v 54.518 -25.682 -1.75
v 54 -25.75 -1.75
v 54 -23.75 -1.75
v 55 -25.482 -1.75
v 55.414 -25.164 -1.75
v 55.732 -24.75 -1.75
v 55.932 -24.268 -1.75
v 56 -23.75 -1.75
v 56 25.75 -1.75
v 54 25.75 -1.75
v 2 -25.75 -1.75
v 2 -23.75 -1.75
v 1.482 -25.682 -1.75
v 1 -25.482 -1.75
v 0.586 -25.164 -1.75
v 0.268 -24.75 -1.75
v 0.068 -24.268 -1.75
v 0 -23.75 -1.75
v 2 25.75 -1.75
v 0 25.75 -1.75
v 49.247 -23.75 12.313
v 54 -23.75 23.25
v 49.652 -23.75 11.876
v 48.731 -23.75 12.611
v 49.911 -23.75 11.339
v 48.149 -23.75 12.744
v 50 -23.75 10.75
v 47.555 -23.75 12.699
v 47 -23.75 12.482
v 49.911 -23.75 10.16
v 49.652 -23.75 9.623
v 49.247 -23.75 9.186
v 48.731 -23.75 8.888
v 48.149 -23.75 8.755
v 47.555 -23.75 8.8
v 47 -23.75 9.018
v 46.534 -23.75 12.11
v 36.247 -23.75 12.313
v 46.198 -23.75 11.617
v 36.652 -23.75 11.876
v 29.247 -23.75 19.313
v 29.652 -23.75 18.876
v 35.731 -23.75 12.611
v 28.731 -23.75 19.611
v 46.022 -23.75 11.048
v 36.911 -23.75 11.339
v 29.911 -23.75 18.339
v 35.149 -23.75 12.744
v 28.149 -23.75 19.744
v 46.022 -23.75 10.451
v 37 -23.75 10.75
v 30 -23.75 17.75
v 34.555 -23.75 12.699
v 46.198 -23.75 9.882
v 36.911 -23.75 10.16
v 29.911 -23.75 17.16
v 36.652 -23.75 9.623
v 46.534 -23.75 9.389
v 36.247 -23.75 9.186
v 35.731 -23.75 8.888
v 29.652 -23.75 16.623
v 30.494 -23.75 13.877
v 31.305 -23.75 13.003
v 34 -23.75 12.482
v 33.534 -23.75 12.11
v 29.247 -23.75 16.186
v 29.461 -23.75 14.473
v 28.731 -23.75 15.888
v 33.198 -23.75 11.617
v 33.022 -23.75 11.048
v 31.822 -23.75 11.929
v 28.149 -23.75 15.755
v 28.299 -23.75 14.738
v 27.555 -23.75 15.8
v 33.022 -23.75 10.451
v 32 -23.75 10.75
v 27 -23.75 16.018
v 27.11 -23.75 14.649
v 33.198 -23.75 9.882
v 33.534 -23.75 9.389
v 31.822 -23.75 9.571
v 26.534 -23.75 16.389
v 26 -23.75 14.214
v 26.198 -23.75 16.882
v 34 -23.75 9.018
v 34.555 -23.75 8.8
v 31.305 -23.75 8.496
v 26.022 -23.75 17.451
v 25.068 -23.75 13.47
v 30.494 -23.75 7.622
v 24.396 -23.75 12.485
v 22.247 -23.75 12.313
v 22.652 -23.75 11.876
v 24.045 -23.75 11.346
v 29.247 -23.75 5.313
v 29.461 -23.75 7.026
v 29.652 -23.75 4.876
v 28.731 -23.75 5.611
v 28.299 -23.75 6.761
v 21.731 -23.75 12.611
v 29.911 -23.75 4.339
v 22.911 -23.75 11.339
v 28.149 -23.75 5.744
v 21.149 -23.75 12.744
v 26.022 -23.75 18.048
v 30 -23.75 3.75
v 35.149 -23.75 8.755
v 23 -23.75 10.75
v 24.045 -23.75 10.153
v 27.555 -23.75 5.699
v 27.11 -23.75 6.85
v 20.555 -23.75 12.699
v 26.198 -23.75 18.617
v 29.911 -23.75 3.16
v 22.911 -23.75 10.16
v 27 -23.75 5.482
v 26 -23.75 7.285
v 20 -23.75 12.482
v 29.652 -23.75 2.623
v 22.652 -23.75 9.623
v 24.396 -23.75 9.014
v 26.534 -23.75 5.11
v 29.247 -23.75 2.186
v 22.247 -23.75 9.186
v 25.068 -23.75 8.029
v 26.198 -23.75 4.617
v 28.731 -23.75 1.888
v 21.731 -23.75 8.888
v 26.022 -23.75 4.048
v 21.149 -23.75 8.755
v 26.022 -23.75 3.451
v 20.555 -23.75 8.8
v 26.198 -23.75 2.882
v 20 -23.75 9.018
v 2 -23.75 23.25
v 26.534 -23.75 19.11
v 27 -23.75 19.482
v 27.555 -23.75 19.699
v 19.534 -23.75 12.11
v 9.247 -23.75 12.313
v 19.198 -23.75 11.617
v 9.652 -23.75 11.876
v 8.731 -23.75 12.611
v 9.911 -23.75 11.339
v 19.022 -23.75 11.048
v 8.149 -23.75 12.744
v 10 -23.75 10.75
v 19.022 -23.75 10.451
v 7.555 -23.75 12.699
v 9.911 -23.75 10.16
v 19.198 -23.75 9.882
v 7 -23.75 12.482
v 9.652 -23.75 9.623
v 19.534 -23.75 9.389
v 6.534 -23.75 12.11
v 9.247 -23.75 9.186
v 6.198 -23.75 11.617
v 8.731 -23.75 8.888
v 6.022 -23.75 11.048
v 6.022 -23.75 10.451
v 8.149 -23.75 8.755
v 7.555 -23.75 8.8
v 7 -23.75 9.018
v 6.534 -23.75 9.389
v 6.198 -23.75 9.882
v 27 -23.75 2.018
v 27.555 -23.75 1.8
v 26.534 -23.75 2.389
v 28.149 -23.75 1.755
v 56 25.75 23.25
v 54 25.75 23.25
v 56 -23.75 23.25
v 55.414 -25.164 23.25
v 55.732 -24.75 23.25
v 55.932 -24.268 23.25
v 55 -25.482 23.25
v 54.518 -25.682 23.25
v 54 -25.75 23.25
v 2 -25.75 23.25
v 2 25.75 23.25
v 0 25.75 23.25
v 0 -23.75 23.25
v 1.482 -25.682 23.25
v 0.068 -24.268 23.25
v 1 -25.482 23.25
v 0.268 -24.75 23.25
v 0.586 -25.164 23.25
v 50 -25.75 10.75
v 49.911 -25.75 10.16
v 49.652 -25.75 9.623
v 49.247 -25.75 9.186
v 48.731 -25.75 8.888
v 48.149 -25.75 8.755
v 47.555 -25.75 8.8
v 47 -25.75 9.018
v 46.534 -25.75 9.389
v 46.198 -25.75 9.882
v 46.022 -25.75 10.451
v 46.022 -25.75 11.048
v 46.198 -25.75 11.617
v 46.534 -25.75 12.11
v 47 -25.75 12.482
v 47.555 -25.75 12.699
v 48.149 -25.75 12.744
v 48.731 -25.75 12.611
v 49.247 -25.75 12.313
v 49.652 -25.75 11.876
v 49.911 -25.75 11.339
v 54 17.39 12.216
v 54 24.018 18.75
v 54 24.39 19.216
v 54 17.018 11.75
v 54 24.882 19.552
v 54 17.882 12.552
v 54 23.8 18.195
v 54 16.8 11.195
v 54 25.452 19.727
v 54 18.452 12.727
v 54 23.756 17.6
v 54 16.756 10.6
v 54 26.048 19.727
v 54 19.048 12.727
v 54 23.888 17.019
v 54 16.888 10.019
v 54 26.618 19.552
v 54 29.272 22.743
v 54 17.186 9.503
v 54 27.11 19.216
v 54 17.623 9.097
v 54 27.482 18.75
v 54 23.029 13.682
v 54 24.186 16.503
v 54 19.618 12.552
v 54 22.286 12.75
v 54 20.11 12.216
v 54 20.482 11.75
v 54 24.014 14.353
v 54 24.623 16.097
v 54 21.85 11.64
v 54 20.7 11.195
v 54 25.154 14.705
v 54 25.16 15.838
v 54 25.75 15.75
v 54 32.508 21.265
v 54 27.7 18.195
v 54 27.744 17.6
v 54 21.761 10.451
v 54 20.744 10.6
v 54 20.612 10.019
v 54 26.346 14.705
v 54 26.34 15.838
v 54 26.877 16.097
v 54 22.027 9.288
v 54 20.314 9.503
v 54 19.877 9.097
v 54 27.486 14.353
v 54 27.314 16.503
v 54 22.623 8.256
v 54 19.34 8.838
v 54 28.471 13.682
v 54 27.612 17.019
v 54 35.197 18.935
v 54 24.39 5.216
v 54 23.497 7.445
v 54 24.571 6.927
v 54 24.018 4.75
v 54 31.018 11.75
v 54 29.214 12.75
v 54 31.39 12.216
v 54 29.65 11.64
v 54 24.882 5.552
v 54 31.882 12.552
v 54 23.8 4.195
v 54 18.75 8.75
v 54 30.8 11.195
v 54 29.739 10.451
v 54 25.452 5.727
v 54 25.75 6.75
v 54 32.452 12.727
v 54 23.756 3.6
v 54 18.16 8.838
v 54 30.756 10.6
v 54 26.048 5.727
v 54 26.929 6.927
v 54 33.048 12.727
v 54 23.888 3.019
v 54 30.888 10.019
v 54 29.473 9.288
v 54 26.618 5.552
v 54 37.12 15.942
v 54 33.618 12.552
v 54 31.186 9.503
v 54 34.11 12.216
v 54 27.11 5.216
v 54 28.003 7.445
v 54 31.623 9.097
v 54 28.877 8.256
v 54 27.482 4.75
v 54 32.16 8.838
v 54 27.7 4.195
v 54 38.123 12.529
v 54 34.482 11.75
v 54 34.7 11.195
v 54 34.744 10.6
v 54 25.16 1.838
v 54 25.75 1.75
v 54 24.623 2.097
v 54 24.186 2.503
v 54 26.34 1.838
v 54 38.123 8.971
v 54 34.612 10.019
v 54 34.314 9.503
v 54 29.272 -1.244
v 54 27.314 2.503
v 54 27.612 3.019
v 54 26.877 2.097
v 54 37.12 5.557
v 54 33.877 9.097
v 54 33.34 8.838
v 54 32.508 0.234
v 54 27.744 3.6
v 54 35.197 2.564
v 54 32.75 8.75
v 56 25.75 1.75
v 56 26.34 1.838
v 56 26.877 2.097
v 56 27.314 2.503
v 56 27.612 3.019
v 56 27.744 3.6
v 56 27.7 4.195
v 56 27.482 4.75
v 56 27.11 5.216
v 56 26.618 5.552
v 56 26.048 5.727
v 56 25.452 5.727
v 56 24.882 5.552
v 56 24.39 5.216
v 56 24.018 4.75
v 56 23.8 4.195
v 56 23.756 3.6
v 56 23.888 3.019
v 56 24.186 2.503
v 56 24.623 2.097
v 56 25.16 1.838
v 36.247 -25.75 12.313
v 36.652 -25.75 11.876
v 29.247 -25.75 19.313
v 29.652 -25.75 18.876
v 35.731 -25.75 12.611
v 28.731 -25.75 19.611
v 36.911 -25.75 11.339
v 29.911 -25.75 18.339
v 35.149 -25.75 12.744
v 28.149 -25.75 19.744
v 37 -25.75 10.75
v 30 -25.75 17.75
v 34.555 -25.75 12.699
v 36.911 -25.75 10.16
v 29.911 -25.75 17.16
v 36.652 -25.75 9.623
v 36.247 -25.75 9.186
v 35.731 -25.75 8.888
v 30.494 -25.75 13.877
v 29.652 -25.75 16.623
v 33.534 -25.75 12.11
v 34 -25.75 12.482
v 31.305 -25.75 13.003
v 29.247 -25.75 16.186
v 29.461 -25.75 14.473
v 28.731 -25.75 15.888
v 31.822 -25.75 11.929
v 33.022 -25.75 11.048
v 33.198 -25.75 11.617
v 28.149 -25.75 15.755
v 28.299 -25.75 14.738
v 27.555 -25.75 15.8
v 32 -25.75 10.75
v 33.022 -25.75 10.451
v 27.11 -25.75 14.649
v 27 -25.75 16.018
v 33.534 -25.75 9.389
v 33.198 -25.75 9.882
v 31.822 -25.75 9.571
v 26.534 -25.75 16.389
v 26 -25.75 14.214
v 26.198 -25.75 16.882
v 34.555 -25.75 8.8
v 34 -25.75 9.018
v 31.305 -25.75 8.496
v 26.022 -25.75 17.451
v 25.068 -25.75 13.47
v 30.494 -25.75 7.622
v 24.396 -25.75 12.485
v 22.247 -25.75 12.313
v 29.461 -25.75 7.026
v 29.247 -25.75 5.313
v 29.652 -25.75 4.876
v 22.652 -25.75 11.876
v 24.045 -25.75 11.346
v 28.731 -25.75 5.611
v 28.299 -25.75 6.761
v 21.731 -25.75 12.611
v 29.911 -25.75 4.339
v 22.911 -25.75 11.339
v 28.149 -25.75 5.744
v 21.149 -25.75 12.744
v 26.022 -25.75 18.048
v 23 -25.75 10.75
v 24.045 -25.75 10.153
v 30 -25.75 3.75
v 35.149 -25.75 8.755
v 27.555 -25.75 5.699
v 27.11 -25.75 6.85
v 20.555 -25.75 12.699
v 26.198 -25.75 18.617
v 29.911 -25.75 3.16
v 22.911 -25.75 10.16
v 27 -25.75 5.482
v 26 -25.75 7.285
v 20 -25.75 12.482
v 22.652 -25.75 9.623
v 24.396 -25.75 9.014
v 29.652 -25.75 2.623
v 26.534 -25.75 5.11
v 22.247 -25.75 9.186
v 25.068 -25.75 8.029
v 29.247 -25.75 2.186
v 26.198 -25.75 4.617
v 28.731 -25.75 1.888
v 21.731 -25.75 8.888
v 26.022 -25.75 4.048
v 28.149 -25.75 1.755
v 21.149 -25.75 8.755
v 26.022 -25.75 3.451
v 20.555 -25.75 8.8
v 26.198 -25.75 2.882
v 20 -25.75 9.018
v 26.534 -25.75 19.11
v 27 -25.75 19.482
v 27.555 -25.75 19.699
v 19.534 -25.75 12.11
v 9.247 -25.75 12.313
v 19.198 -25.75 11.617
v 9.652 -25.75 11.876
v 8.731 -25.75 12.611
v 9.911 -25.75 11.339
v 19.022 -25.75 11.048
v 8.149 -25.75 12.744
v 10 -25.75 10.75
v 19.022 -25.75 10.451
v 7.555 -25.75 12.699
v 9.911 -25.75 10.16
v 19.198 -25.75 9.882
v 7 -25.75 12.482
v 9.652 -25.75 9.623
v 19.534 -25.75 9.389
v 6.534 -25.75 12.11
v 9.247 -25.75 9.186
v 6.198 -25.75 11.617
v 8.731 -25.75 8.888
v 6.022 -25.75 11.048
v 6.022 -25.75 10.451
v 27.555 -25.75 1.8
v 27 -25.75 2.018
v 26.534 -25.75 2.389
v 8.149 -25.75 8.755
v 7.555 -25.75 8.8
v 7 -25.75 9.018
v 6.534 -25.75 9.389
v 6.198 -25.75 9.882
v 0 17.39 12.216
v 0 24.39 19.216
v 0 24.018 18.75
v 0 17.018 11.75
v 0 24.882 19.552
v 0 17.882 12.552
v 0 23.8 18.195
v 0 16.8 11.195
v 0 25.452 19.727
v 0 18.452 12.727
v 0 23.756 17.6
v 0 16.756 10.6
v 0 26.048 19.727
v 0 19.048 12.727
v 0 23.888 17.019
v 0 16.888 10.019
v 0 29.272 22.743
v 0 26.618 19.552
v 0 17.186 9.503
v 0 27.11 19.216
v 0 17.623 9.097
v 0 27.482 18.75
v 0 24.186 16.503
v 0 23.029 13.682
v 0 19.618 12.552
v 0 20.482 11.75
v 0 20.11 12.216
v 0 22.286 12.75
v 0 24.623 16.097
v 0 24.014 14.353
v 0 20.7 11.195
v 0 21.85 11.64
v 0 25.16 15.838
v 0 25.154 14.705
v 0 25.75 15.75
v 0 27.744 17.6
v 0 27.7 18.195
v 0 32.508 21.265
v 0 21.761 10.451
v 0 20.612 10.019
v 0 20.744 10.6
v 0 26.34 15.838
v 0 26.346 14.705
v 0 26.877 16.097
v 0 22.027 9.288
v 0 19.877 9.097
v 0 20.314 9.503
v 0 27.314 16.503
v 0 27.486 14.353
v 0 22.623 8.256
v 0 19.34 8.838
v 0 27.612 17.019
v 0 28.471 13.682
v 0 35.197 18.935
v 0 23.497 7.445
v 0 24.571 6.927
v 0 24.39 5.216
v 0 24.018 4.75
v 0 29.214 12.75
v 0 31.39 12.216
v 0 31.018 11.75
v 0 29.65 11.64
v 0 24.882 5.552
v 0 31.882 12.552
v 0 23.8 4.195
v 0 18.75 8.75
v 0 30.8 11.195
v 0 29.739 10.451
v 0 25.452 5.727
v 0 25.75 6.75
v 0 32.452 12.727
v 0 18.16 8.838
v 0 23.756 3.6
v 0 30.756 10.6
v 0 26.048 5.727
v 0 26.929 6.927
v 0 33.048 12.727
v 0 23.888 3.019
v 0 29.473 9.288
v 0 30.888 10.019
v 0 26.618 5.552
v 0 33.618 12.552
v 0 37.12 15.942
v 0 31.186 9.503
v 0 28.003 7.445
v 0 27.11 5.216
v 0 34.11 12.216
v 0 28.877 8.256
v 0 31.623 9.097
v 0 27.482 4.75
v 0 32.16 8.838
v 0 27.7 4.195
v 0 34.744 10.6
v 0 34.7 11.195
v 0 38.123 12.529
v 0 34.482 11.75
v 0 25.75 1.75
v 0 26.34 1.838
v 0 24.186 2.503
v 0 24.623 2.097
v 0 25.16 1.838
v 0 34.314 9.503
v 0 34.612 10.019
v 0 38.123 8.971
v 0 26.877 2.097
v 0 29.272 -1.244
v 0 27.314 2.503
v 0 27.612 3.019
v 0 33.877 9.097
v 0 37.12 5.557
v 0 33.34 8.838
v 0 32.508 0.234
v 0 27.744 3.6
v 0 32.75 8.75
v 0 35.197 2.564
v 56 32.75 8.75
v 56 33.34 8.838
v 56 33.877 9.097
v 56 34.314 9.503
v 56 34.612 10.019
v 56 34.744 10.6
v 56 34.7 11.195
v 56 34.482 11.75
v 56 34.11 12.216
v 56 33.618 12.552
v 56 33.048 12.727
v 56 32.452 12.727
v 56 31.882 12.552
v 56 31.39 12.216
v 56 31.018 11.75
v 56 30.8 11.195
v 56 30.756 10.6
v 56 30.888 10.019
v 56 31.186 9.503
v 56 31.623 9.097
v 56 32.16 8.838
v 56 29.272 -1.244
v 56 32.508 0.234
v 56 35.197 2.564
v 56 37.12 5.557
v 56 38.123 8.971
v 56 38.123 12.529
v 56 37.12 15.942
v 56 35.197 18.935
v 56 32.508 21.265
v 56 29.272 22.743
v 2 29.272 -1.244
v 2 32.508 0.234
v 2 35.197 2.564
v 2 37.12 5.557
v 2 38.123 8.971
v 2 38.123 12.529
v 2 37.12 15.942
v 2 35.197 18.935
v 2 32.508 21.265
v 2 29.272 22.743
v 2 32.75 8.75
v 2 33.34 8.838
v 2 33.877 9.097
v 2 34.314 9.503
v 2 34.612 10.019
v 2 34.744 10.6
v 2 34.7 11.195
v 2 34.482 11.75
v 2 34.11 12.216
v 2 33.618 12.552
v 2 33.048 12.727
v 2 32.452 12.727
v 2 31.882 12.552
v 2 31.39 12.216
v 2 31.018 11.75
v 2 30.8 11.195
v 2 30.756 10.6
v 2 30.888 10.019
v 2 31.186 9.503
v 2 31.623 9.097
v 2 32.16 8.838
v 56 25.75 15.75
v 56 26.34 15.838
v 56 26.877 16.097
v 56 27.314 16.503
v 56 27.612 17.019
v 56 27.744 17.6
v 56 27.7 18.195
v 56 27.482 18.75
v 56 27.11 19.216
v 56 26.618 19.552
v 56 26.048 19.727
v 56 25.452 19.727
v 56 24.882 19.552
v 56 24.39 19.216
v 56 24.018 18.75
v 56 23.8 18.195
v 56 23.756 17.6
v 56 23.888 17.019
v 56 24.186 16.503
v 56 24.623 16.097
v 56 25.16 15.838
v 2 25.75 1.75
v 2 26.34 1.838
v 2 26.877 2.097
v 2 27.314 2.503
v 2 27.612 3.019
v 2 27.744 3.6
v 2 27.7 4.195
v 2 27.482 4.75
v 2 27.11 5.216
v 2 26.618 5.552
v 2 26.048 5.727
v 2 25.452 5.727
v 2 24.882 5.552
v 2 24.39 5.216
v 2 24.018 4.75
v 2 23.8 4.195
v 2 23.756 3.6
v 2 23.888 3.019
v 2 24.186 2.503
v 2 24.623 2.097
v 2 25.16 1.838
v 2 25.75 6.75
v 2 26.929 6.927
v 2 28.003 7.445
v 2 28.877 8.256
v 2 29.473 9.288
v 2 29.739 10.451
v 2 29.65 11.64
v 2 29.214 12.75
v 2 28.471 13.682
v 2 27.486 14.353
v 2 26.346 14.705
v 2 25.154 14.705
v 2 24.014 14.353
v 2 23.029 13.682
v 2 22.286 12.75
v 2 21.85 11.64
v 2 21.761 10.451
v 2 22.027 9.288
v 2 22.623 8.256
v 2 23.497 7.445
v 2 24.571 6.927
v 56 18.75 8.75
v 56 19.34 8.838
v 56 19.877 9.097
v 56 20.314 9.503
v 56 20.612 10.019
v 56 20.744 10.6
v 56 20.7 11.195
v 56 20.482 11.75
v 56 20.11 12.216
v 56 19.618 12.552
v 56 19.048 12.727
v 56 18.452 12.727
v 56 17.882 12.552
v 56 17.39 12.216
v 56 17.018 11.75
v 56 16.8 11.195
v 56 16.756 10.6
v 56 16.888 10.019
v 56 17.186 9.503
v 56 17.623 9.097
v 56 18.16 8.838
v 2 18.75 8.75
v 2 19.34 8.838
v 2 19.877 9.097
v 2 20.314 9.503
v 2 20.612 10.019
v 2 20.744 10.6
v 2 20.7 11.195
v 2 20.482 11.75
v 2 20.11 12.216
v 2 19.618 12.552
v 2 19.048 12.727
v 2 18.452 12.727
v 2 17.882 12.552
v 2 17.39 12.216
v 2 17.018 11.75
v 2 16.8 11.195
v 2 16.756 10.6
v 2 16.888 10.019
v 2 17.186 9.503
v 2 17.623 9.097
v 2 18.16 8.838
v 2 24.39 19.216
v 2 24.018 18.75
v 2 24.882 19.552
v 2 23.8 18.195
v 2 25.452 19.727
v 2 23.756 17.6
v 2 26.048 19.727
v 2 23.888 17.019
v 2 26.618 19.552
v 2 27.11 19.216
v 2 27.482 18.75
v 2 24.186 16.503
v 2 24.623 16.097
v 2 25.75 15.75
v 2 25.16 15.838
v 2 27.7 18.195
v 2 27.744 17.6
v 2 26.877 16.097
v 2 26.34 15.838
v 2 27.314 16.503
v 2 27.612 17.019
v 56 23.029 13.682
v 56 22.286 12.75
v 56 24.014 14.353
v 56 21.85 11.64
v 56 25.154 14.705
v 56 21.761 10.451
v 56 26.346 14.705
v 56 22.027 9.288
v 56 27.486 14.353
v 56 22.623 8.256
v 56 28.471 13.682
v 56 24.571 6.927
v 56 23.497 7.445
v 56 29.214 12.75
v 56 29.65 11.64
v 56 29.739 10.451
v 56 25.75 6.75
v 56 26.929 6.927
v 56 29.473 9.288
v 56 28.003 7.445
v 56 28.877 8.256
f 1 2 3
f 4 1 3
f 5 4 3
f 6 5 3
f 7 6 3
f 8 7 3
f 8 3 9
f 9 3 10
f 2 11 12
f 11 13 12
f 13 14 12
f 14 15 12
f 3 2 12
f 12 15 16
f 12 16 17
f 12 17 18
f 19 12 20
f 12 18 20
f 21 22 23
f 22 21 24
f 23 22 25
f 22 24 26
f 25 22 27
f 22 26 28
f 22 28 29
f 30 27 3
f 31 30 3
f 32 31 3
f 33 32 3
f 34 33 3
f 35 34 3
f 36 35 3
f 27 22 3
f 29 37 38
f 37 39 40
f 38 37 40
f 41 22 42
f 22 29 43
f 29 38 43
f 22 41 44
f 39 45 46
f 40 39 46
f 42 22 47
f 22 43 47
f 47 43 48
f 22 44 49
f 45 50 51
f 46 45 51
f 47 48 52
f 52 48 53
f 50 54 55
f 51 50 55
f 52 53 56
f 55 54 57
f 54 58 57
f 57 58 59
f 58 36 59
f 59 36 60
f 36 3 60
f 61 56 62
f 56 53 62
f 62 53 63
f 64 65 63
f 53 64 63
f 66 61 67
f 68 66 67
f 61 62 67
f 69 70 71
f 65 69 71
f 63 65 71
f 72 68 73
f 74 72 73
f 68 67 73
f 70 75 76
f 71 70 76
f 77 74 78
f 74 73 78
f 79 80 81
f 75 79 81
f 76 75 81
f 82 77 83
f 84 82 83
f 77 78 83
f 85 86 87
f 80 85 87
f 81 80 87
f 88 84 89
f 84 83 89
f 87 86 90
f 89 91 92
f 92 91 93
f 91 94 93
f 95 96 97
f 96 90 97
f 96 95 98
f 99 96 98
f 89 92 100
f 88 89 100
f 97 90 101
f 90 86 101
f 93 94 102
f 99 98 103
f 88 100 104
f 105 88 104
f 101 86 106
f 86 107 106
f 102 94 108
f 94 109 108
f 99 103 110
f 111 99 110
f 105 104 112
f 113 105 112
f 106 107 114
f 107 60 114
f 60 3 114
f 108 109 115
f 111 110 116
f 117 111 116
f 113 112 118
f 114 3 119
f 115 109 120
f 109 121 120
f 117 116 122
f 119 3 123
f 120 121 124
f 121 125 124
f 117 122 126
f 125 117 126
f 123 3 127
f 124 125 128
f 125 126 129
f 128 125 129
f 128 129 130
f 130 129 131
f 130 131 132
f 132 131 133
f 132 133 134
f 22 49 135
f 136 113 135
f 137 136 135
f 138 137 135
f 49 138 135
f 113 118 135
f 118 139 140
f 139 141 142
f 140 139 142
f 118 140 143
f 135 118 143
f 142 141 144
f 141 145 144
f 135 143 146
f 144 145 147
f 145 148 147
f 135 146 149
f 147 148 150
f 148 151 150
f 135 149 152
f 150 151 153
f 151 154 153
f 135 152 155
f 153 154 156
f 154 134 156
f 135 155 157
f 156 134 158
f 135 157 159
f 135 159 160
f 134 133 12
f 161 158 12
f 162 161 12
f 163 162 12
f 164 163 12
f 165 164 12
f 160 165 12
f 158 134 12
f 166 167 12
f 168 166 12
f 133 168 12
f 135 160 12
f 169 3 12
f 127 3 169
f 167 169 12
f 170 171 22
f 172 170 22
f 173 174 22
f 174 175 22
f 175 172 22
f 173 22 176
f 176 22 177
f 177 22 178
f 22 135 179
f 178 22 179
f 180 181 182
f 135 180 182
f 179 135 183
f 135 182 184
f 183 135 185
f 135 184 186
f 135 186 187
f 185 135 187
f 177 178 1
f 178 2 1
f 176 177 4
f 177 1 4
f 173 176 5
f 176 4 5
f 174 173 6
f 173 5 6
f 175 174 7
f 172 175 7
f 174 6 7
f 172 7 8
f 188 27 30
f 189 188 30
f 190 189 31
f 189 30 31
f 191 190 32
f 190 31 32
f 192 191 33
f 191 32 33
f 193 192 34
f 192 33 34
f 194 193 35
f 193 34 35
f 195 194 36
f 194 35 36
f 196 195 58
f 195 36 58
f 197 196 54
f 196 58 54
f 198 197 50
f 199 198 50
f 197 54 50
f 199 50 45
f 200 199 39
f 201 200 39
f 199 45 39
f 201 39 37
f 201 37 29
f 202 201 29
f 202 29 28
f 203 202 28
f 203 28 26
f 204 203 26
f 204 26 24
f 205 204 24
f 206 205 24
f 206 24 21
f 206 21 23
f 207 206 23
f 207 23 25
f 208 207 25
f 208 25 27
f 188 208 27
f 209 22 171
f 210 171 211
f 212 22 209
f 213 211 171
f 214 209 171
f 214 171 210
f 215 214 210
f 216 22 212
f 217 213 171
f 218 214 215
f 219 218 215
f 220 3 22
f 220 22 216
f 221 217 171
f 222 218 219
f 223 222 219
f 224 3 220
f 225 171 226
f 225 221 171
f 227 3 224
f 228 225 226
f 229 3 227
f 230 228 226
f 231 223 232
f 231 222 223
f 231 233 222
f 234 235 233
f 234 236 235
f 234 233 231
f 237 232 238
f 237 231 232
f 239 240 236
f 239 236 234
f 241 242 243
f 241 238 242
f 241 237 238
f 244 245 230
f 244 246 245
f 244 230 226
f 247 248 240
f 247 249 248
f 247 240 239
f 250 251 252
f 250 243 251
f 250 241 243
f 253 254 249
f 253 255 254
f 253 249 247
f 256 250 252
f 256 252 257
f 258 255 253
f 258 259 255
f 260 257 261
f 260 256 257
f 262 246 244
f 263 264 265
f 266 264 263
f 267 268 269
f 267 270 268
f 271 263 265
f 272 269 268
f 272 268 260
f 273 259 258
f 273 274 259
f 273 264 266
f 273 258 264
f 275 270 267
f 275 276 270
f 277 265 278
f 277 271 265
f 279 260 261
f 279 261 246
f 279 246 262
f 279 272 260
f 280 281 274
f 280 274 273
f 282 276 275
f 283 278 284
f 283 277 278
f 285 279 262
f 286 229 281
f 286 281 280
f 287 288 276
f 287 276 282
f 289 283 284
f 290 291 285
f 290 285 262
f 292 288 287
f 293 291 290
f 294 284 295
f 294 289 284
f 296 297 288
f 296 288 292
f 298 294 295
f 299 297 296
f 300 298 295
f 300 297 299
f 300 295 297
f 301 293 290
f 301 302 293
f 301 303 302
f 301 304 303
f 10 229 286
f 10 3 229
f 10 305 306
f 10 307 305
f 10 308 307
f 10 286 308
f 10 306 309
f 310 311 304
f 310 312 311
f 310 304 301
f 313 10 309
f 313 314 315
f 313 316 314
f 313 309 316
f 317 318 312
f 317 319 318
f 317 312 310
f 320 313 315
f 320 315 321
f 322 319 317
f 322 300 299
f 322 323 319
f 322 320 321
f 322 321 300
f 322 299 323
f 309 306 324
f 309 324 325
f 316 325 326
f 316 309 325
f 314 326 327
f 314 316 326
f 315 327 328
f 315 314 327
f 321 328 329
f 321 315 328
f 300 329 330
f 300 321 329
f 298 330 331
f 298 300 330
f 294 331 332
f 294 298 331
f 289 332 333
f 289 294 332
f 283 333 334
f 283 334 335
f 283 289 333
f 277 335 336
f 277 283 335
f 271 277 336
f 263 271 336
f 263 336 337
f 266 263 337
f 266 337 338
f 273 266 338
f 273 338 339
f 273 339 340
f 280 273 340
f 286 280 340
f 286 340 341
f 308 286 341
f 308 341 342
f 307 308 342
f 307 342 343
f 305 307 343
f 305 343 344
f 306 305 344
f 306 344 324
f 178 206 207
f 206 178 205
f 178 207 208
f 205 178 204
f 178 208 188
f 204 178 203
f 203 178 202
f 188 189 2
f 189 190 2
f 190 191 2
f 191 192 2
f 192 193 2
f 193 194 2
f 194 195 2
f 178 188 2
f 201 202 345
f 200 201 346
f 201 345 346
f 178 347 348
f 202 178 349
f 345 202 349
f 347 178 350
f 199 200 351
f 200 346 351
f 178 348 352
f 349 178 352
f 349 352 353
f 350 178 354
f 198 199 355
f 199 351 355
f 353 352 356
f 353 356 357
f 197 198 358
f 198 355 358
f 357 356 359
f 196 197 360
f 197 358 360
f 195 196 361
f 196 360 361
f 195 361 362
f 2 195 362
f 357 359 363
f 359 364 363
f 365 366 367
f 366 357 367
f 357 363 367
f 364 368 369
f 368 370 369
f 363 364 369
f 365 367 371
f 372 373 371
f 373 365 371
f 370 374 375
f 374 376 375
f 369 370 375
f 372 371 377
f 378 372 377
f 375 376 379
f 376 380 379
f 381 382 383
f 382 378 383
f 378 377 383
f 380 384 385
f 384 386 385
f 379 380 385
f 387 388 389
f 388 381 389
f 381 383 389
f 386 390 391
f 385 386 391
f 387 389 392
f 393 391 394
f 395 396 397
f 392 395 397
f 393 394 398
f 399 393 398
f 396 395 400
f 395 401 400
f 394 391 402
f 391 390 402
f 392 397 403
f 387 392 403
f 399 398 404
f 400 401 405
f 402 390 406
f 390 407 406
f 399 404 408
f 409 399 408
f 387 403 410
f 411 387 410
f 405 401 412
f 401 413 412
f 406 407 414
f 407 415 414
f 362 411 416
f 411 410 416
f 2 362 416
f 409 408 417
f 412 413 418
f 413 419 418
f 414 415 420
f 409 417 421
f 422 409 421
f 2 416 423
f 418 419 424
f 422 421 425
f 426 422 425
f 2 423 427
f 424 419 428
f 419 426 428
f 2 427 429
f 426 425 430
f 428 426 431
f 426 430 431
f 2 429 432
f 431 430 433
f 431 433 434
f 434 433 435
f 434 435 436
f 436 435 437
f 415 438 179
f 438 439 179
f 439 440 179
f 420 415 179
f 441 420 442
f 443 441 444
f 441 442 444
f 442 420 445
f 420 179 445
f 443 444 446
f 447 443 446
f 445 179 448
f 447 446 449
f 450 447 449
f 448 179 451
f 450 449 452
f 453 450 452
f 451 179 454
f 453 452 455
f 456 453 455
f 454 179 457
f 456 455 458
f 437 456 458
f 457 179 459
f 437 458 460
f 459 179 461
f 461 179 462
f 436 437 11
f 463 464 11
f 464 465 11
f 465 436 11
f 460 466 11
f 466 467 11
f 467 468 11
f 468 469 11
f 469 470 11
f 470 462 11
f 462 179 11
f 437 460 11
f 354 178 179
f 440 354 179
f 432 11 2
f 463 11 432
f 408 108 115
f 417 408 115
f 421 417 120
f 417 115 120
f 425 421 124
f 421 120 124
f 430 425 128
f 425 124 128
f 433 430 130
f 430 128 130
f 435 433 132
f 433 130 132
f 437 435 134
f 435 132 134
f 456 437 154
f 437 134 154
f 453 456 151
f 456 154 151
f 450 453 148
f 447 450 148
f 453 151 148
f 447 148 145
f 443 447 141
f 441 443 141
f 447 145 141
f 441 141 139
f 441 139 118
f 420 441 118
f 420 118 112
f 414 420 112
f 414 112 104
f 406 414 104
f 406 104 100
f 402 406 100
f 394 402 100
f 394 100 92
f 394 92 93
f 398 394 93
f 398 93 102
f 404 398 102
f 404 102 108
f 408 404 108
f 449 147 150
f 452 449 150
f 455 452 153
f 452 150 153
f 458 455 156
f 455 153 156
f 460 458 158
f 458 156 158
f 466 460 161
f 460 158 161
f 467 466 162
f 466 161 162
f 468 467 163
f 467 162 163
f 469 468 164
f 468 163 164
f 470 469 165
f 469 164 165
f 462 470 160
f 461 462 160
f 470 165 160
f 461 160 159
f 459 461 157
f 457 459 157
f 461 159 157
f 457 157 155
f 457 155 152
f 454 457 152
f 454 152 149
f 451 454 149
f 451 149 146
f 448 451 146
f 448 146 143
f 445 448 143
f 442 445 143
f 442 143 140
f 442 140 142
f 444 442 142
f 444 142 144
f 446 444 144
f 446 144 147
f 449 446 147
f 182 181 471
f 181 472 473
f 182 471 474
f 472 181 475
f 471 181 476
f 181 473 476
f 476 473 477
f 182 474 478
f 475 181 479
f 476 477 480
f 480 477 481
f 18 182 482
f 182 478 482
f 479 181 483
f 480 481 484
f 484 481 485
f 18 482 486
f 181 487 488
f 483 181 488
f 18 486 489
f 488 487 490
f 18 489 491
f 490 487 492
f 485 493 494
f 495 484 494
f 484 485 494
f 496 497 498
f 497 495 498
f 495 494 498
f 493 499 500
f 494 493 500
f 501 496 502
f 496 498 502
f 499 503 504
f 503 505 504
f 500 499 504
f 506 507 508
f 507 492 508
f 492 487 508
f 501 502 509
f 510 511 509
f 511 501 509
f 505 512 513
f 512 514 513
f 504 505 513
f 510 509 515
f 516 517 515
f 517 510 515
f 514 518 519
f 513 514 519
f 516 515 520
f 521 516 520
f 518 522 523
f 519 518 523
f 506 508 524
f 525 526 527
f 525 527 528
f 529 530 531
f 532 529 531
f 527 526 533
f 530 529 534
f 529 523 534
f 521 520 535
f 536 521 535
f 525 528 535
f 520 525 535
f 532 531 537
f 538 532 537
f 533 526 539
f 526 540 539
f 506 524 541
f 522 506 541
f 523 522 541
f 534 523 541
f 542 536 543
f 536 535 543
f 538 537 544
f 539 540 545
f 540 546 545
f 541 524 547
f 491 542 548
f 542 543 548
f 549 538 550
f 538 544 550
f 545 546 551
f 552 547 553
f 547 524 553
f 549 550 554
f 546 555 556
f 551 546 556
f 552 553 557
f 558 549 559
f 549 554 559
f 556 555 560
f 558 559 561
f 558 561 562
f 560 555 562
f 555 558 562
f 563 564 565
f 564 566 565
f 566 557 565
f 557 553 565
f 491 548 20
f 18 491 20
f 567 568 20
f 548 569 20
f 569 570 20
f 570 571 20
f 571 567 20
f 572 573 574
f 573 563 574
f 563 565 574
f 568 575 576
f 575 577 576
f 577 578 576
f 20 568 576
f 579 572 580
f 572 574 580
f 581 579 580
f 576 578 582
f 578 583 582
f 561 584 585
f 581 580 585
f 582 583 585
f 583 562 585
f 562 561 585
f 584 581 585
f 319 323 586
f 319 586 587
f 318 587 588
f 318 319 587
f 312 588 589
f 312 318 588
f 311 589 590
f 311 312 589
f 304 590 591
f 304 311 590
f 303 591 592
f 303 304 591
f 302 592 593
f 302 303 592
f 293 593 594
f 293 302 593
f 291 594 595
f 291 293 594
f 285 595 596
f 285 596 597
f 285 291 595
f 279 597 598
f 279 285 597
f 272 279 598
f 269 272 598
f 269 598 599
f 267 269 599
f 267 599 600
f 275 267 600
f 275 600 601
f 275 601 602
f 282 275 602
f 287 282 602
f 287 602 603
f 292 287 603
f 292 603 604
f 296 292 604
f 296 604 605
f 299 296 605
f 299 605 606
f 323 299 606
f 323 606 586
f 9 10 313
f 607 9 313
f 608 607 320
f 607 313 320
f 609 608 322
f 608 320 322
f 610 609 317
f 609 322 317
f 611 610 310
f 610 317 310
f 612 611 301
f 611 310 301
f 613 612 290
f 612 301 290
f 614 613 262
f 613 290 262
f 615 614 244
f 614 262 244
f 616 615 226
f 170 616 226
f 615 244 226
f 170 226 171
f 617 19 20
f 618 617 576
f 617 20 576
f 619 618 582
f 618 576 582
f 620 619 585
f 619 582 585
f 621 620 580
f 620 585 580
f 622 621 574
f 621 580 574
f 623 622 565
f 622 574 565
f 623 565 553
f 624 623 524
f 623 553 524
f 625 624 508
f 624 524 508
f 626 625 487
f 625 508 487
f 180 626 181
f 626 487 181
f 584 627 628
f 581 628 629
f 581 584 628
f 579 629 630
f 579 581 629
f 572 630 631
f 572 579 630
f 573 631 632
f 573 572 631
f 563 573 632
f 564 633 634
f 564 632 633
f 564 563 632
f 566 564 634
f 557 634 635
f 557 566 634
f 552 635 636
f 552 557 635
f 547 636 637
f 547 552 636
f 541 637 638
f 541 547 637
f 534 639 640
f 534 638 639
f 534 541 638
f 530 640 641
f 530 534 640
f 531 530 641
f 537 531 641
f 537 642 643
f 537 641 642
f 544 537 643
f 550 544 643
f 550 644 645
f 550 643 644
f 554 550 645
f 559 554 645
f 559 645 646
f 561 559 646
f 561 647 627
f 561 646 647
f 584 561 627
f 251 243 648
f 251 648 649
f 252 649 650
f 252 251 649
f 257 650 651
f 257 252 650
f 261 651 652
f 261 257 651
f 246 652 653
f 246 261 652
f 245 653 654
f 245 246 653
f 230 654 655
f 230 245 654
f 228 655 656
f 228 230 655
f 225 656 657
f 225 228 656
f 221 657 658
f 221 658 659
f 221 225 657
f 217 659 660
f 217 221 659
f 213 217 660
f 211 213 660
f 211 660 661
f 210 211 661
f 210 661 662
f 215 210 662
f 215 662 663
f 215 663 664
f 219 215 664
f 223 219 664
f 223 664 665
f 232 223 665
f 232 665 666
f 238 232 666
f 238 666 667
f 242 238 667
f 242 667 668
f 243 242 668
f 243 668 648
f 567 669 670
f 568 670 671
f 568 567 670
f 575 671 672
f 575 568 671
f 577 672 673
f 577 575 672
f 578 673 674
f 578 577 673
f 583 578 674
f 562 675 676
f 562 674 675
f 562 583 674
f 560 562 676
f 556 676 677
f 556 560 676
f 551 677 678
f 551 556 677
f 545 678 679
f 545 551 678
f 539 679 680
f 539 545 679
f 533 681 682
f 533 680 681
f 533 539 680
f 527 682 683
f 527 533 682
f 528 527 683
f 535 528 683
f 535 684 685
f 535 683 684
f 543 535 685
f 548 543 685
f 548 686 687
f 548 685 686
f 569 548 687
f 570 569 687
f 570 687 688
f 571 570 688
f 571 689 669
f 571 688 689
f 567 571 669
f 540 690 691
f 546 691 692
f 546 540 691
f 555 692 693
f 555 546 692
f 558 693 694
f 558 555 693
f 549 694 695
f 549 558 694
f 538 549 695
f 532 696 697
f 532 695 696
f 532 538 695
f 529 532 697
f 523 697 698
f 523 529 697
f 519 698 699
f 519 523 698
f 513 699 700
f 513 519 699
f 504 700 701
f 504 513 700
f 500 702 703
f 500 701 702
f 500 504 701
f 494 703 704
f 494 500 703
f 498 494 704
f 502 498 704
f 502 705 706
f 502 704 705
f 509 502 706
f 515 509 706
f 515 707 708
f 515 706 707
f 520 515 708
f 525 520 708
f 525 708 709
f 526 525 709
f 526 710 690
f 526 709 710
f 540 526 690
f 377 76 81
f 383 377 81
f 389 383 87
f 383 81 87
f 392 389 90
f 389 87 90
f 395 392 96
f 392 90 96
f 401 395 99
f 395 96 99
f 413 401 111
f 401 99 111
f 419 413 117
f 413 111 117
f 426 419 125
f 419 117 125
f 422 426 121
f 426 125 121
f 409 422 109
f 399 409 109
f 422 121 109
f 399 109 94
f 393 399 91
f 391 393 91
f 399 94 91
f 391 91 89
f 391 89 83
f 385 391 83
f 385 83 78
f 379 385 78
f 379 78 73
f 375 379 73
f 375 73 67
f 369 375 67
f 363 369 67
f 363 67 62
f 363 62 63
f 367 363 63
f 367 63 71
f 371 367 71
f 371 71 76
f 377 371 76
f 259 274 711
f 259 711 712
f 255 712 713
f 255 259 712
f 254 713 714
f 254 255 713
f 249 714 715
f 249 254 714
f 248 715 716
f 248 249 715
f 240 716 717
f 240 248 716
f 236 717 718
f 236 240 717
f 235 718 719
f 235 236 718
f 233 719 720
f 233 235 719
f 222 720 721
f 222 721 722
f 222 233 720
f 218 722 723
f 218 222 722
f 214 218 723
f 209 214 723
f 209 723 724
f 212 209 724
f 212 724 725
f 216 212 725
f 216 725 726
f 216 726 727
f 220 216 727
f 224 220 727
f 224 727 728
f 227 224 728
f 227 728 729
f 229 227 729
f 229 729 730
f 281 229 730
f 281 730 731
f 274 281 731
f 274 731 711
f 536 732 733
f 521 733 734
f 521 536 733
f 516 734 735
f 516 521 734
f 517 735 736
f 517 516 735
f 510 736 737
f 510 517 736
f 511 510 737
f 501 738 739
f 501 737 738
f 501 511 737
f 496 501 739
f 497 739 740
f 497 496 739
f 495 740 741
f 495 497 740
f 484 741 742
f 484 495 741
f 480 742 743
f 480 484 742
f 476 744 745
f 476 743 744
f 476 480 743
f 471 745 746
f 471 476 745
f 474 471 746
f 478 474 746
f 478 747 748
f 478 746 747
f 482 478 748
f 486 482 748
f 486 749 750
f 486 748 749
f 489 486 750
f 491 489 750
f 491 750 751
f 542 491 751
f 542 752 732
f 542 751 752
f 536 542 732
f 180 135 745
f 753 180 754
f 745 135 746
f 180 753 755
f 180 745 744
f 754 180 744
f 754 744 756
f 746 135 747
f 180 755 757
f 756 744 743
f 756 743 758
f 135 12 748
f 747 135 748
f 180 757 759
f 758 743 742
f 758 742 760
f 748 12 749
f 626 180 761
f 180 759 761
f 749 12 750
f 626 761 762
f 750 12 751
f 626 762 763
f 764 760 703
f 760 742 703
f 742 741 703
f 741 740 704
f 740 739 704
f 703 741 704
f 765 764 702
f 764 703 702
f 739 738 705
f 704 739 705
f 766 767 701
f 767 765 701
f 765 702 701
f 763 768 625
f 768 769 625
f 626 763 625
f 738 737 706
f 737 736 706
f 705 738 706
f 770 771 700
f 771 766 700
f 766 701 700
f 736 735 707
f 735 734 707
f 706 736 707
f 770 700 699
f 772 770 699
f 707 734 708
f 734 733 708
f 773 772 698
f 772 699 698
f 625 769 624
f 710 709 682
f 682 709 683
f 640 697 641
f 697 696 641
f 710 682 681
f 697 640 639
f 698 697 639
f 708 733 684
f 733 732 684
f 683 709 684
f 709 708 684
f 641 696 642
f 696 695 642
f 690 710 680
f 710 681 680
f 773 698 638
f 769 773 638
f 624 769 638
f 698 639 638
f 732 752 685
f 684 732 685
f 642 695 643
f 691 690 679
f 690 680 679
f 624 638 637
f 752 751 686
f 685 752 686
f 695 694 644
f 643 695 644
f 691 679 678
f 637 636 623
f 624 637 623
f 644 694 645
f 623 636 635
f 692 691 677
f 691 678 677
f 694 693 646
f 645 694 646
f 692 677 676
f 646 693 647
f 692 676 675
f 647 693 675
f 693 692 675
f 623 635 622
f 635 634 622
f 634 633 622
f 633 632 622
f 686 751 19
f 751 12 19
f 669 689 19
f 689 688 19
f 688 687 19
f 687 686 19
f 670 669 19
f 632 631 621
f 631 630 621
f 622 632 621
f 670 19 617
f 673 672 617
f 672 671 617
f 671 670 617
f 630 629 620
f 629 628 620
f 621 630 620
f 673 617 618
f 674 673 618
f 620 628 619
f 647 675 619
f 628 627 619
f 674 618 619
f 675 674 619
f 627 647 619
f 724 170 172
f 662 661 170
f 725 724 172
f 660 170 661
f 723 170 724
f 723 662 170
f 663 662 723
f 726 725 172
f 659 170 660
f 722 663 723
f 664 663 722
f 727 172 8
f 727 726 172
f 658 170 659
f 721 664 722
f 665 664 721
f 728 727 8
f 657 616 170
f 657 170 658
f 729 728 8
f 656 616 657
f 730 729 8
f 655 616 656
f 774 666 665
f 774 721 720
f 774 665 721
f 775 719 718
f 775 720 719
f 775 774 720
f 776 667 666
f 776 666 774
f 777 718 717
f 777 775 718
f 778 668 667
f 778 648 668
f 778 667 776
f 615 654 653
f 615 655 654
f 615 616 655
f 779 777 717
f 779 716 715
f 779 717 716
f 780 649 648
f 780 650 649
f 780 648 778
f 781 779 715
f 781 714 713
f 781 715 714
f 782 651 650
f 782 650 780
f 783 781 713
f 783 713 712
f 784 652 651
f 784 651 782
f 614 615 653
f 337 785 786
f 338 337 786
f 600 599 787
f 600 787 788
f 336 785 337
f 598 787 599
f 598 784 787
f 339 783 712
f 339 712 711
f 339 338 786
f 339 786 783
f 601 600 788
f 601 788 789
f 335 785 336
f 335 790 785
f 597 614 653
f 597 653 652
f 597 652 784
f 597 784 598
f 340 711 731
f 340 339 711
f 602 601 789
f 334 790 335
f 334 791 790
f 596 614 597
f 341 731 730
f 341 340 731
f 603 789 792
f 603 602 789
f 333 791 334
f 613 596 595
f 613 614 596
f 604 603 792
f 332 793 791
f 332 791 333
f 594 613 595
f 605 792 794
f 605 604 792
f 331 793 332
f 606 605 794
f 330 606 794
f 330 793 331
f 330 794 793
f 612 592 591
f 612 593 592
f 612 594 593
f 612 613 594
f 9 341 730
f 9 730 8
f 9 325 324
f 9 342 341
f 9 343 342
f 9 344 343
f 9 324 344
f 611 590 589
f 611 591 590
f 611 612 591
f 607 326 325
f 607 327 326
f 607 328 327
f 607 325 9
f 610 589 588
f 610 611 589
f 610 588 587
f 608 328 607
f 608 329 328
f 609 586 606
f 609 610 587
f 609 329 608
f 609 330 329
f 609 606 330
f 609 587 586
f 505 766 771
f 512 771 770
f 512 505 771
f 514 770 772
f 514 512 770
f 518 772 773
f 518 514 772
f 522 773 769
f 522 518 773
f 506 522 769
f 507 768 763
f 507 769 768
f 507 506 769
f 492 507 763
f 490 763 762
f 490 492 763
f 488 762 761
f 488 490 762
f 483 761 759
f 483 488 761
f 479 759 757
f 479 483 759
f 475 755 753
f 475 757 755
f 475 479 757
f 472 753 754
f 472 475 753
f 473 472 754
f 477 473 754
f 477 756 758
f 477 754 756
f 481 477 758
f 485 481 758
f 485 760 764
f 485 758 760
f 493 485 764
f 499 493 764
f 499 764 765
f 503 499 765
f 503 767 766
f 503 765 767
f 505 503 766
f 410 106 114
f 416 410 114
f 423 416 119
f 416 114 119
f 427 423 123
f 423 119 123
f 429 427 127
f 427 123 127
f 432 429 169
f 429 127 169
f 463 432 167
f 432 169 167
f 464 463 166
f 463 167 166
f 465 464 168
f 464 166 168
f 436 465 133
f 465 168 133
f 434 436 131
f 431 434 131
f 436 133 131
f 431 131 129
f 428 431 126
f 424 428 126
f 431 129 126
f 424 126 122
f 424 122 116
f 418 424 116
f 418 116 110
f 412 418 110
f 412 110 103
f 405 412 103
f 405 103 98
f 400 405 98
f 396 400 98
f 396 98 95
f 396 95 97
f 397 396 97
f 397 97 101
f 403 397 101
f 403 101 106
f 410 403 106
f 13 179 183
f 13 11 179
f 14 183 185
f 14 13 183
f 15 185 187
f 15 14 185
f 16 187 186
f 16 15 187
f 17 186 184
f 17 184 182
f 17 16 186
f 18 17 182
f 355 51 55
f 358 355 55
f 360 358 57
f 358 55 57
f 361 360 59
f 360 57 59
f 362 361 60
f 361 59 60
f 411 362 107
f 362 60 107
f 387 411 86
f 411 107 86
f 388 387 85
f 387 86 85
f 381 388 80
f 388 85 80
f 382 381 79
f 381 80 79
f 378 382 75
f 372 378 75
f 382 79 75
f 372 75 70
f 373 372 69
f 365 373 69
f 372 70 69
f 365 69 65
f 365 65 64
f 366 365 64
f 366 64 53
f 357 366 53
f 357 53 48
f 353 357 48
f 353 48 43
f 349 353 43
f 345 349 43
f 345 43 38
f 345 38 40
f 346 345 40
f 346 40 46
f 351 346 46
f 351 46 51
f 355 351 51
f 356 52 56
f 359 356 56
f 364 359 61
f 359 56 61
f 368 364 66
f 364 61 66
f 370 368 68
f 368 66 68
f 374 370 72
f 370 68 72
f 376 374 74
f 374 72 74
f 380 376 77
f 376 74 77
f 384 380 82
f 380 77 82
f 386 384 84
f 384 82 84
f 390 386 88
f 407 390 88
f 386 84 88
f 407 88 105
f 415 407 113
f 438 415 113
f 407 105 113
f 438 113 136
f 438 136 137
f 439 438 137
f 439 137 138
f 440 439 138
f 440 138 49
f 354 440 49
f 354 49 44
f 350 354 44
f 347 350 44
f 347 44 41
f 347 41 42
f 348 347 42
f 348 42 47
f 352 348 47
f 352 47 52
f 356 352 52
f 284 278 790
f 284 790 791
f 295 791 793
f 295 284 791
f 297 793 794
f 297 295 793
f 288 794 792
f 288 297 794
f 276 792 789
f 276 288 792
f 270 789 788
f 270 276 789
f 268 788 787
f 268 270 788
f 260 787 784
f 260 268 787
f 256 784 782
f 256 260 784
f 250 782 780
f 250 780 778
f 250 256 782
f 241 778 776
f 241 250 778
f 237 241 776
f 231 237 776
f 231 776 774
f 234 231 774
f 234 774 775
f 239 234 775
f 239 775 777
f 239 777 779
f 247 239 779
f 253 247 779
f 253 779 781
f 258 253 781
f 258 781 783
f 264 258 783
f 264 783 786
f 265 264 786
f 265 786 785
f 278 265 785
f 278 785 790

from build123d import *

# Parameters (mm, degrees)
SKETCH_2_R          = 4
SKETCH_2_R_2        = 2
EXTRUDE_1_DEPTH     = 56
CUT_EXTRUDE_1_REACH = 27
SKETCH_3_W          = 52
SKETCH_3_H          = 64
CUT_EXTRUDE_2_REACH = 4
SKETCH_4_R          = 4
SKETCH_4_R_2        = 2
FILLET_1_R          = 2
FILLET_2_R          = 2


with BuildPart() as part:
    # 草图2 → 凸台-拉伸1 (new body)
    with BuildSketch(Plane(origin=(0, 0, 0), x_dir=(0, 0, -1), z_dir=(1, 0, 0))):
        with BuildLine():
            Line((-23.249580799, 25.750000985), (-23.249580799, -25.75))
            Line((-23.249580799, -25.75), (1.750419201, -25.75))
            Line((1.750419201, -25.75), (1.750419201, 25.75))
            ThreePointArc((1.750419201, 25.75), (-10.749580306, 38.250000985), (-23.249580799, 25.750000985))
        make_face()
        with Locations((-10.749580799, 25.750000985)):
            Circle(SKETCH_2_R, mode=Mode.SUBTRACT)
        with Locations((-10.749580799, 32.750000985)):
            Circle(SKETCH_2_R_2, mode=Mode.SUBTRACT)
        with Locations((-17.749579814, 25.75000197)):
            Circle(SKETCH_2_R_2, mode=Mode.SUBTRACT)
        with Locations((-10.749580799, 18.750002956)):
            Circle(SKETCH_2_R_2, mode=Mode.SUBTRACT)
        with Locations((-3.749581784, 25.75000197)):
            Circle(SKETCH_2_R_2, mode=Mode.SUBTRACT)
    extrude(amount=EXTRUDE_1_DEPTH)

    # 草图3 → 切除-拉伸1 (cut, up to next)
    with BuildSketch(Plane(origin=(0, 0, -1.750419201), x_dir=(-1, 0, 0), z_dir=(0, 0, -1)), mode=Mode.PRIVATE) as cut_extrude_1_sk1:
        with Locations((-28, 8.25)):
            Rectangle(SKETCH_3_W, SKETCH_3_H)
    cut_extrude_1_tool1 = extrude(cut_extrude_1_sk1.sketch, amount=-CUT_EXTRUDE_1_REACH, mode=Mode.PRIVATE) & part.part
    add(cut_extrude_1_tool1.solids().sort_by_distance((28, 8.25, -1.750419))[0], mode=Mode.SUBTRACT)

    # 草图4 → 切除-拉伸2 (cut, up to next)
    with BuildSketch(Plane(origin=(0, -23.75, 0), x_dir=(1, 0, 0), z_dir=(0, 1, 0)), mode=Mode.PRIVATE) as cut_extrude_2_sk1:
        with Locations((28, -10.749580799)):
            Circle(SKETCH_4_R)
    cut_extrude_2_tool1 = extrude(cut_extrude_2_sk1.sketch, amount=-CUT_EXTRUDE_2_REACH, mode=Mode.PRIVATE) & part.part
    add(cut_extrude_2_tool1.solids().sort_by_distance((28, -23.75, 10.749581))[0], mode=Mode.SUBTRACT)
    # 草图4 → 切除-拉伸2 (cut, up to next)
    with BuildSketch(Plane(origin=(0, -23.75, 0), x_dir=(1, 0, 0), z_dir=(0, 1, 0)), mode=Mode.PRIVATE) as cut_extrude_2_sk2:
        with Locations((35, -10.749580799)):
            Circle(SKETCH_4_R_2)
    cut_extrude_2_tool2 = extrude(cut_extrude_2_sk2.sketch, amount=-CUT_EXTRUDE_2_REACH, mode=Mode.PRIVATE) & part.part
    add(cut_extrude_2_tool2.solids().sort_by_distance((35, -23.75, 10.749581))[0], mode=Mode.SUBTRACT)
    # 草图4 → 切除-拉伸2 (cut, up to next)
    with BuildSketch(Plane(origin=(0, -23.75, 0), x_dir=(1, 0, 0), z_dir=(0, 1, 0)), mode=Mode.PRIVATE) as cut_extrude_2_sk3:
        with Locations((28, -17.749580799)):
            Circle(SKETCH_4_R_2)
    cut_extrude_2_tool3 = extrude(cut_extrude_2_sk3.sketch, amount=-CUT_EXTRUDE_2_REACH, mode=Mode.PRIVATE) & part.part
    add(cut_extrude_2_tool3.solids().sort_by_distance((28, -23.75, 17.749581))[0], mode=Mode.SUBTRACT)
    # 草图4 → 切除-拉伸2 (cut, up to next)
    with BuildSketch(Plane(origin=(0, -23.75, 0), x_dir=(1, 0, 0), z_dir=(0, 1, 0)), mode=Mode.PRIVATE) as cut_extrude_2_sk4:
        with Locations((21, -10.749580799)):
            Circle(SKETCH_4_R_2)
    cut_extrude_2_tool4 = extrude(cut_extrude_2_sk4.sketch, amount=-CUT_EXTRUDE_2_REACH, mode=Mode.PRIVATE) & part.part
    add(cut_extrude_2_tool4.solids().sort_by_distance((21, -23.75, 10.749581))[0], mode=Mode.SUBTRACT)
    # 草图4 → 切除-拉伸2 (cut, up to next)
    with BuildSketch(Plane(origin=(0, -23.75, 0), x_dir=(1, 0, 0), z_dir=(0, 1, 0)), mode=Mode.PRIVATE) as cut_extrude_2_sk5:
        with Locations((28, -3.749580799)):
            Circle(SKETCH_4_R_2)
    cut_extrude_2_tool5 = extrude(cut_extrude_2_sk5.sketch, amount=-CUT_EXTRUDE_2_REACH, mode=Mode.PRIVATE) & part.part
    add(cut_extrude_2_tool5.solids().sort_by_distance((28, -23.75, 3.749581))[0], mode=Mode.SUBTRACT)
    # 草图4 → 切除-拉伸2 (cut, up to next)
    with BuildSketch(Plane(origin=(0, -23.75, 0), x_dir=(1, 0, 0), z_dir=(0, 1, 0)), mode=Mode.PRIVATE) as cut_extrude_2_sk6:
        with Locations((8, -10.749580799)):
            Circle(SKETCH_4_R_2)
    cut_extrude_2_tool6 = extrude(cut_extrude_2_sk6.sketch, amount=-CUT_EXTRUDE_2_REACH, mode=Mode.PRIVATE) & part.part
    add(cut_extrude_2_tool6.solids().sort_by_distance((8, -23.75, 10.749581))[0], mode=Mode.SUBTRACT)
    # 草图4 → 切除-拉伸2 (cut, up to next)
    with BuildSketch(Plane(origin=(0, -23.75, 0), x_dir=(1, 0, 0), z_dir=(0, 1, 0)), mode=Mode.PRIVATE) as cut_extrude_2_sk7:
        with Locations((48, -10.749580799)):
            Circle(SKETCH_4_R_2)
    cut_extrude_2_tool7 = extrude(cut_extrude_2_sk7.sketch, amount=-CUT_EXTRUDE_2_REACH, mode=Mode.PRIVATE) & part.part
    add(cut_extrude_2_tool7.solids().sort_by_distance((48, -23.75, 10.749581))[0], mode=Mode.SUBTRACT)

    # 圆角1
    fillet_1_edges = [part.edges().sort_by_distance(p)[0] for p in [
        (56, -25.75, 10.749580799),
    ]]
    fillet(fillet_1_edges, radius=FILLET_1_R)

    # 圆角2
    fillet_2_edges = [part.edges().sort_by_distance(p)[0] for p in [
        (0, -25.75, 10.749580799),
    ]]
    fillet(fillet_2_edges, radius=FILLET_2_R)


solid = part.part
